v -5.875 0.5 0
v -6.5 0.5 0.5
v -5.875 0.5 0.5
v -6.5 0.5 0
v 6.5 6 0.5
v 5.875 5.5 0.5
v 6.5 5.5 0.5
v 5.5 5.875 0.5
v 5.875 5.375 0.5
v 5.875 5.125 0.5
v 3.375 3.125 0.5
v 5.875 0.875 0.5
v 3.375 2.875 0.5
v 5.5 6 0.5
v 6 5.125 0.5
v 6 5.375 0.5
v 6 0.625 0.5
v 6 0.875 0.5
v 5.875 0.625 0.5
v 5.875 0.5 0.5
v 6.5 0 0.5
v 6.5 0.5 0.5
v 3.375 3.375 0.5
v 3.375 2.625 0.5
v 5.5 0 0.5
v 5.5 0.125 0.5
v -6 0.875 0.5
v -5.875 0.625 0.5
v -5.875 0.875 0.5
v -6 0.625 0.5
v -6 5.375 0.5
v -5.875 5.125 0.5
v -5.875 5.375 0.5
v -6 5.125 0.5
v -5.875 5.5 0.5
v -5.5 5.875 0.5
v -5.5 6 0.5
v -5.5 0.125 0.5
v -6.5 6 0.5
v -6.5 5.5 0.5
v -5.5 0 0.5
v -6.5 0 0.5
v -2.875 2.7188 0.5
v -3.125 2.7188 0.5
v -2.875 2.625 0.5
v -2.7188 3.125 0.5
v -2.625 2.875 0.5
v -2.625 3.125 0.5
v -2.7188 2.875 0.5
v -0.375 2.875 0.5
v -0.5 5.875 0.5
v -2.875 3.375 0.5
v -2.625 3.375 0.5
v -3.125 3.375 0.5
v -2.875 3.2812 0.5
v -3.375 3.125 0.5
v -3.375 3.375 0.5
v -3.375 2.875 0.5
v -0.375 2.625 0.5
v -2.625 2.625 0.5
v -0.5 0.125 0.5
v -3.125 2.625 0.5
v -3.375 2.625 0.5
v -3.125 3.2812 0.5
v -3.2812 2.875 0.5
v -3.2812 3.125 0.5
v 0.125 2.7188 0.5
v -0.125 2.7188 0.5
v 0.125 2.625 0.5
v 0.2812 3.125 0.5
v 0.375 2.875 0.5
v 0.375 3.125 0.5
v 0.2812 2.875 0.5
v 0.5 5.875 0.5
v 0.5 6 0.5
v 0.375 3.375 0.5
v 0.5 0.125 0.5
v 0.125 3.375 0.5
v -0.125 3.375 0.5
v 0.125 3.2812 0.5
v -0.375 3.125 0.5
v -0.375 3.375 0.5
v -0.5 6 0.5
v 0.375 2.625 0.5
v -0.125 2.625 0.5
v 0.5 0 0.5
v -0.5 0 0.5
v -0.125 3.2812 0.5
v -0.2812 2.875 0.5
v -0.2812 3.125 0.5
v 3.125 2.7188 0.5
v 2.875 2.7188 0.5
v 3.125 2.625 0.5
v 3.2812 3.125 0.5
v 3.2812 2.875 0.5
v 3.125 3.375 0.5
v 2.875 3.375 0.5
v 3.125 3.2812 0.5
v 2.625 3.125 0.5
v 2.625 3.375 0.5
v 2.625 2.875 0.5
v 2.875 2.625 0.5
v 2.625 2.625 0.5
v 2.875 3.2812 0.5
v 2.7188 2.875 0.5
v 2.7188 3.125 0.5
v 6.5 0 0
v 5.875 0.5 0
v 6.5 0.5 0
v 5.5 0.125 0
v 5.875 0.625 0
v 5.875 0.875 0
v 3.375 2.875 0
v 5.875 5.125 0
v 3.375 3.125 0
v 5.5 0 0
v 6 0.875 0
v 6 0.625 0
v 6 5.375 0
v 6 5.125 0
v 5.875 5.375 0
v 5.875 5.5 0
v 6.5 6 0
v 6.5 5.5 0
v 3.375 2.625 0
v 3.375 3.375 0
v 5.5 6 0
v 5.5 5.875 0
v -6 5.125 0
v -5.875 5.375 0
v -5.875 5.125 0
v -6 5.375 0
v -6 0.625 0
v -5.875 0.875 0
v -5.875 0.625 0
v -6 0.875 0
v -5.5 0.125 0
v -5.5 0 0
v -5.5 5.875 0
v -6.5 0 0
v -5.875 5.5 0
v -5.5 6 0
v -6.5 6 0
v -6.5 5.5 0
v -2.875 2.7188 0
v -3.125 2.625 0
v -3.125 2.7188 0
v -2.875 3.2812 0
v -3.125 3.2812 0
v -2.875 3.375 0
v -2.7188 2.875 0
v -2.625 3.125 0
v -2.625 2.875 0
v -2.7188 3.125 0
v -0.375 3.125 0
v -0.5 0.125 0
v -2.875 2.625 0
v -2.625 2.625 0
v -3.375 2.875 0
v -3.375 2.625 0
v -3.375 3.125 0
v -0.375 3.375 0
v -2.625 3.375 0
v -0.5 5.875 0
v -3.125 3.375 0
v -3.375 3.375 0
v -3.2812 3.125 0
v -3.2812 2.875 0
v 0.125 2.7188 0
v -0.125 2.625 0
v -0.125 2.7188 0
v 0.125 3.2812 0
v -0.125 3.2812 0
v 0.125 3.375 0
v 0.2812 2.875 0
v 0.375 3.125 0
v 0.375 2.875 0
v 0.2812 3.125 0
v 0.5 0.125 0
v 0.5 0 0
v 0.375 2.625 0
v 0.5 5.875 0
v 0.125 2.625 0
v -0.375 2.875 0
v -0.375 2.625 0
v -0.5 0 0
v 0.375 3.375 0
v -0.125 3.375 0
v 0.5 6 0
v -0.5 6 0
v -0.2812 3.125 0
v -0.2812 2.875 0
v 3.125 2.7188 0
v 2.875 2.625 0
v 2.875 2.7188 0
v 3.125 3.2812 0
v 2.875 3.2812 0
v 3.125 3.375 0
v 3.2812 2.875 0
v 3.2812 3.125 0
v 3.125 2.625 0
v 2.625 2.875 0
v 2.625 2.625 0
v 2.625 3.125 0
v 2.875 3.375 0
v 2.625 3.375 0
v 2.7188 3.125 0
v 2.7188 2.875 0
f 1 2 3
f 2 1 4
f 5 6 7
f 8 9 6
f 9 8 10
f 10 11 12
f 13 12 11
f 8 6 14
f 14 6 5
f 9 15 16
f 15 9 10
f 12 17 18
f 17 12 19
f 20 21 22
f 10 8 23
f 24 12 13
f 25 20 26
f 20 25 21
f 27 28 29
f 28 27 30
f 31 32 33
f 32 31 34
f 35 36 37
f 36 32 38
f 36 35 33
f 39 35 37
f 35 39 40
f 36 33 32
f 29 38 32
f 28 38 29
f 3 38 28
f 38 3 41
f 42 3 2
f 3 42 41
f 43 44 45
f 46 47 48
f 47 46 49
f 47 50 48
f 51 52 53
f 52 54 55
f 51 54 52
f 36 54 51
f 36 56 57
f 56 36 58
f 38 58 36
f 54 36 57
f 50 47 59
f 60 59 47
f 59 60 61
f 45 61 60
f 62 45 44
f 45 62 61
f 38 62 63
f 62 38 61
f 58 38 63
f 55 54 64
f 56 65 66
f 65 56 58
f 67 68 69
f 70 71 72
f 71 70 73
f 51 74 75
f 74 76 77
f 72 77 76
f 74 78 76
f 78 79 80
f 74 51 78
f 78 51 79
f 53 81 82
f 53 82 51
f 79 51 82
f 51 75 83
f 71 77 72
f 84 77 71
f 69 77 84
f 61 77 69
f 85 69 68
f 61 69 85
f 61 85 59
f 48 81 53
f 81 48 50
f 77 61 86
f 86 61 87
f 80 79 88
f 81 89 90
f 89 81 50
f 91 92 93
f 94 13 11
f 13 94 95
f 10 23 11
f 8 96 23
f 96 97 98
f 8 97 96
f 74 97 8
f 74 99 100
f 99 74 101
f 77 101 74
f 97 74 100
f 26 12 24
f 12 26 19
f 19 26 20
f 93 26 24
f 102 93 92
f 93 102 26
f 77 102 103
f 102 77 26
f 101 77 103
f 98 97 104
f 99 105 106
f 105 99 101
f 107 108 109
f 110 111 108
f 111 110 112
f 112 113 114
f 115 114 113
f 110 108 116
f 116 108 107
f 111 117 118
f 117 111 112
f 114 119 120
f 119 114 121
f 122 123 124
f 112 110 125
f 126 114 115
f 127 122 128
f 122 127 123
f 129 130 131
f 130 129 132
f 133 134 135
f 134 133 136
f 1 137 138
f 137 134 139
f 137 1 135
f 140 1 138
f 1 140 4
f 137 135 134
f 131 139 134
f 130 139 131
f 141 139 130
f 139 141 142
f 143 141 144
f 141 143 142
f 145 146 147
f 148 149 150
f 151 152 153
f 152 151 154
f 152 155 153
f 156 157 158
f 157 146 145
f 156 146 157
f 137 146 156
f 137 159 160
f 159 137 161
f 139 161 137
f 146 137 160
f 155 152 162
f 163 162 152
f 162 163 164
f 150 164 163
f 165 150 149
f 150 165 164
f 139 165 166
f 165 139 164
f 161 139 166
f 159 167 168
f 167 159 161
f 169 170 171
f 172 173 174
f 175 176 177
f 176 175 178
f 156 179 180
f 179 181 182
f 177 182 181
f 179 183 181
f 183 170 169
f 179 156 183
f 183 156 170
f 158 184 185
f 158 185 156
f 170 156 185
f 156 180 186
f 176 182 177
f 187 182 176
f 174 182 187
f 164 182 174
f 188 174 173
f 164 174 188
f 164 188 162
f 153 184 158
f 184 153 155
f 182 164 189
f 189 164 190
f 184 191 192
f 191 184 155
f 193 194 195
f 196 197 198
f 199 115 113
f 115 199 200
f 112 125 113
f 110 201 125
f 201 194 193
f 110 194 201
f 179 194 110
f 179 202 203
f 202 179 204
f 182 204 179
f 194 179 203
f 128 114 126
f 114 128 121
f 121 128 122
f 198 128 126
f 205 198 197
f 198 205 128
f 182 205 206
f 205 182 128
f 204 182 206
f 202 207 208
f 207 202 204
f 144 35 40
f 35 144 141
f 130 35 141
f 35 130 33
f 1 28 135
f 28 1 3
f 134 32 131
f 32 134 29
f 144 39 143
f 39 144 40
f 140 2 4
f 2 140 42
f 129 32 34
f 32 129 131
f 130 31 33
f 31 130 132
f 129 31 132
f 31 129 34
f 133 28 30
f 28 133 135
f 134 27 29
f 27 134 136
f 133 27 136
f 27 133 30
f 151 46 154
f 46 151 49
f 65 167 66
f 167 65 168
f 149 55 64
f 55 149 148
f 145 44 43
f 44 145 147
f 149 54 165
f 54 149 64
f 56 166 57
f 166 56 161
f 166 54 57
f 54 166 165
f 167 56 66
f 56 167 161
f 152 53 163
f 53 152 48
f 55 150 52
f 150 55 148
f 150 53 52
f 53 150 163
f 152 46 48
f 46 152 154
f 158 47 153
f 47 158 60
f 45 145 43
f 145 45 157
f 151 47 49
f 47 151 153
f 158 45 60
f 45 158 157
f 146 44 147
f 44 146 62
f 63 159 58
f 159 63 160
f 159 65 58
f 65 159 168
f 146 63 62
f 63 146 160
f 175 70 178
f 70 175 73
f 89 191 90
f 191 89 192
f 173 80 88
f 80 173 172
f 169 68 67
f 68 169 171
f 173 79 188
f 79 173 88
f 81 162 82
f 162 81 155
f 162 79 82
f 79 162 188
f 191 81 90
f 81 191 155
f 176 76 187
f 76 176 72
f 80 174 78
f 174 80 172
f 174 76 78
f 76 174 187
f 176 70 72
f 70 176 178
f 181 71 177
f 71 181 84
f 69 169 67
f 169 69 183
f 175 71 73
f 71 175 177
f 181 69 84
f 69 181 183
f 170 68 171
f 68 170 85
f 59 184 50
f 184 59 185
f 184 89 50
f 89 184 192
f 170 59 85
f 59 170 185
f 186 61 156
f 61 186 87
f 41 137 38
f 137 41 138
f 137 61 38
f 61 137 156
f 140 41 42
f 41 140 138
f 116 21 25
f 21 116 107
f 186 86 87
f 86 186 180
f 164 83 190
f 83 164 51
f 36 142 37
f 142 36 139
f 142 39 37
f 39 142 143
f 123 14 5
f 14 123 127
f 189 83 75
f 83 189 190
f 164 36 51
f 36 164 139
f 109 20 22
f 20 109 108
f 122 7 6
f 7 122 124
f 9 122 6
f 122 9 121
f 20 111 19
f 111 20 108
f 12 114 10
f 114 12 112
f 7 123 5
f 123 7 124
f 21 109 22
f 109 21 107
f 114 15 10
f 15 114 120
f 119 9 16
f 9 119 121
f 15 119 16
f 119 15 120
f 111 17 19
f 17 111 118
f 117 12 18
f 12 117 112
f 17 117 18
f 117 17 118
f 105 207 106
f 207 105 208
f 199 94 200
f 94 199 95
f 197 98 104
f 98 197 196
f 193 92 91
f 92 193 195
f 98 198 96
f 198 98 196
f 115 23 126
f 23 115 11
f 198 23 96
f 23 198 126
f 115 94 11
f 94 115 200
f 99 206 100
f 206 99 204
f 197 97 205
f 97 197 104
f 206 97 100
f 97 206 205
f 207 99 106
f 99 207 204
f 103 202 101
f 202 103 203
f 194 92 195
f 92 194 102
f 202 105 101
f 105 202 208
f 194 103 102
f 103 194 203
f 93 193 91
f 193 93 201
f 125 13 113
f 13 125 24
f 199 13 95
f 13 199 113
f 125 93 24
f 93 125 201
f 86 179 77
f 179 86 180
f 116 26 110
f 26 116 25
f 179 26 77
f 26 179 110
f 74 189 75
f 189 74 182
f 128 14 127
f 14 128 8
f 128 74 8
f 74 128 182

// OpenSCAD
// file: modus.scad
//Corner Joint - allows the sides of two parts to create inlayed corner. Aids with welding.
//need to verify module math is the same throughout all parts.

module cornerjoint(Z,L,H,EndGap,PadL,PadH,CJangle,CJcenter){
    //change so that H = Z of inlayed part (usually 0.5)
    //add center and angle in degrees option, orgin far side of cut out area

     if((CJangle==0)&&(CJcenter==0))
      {    
        translate([0,0,0])
        rotate([0,0,CJangle])
        difference(){
        cube([L,H+PadH,Z]);
        translate([EndGap,H,0])
        cube([PadL,PadH,Z]);
        translate([L-EndGap-PadL,H,0])
        cube([PadL,PadH,Z]);}
      }    
else if((CJangle==90)&&(CJcenter==0))
      {    
        translate([H+PadH,0,0])
        rotate([0,0,CJangle])
        difference(){
        cube([L,H+PadH,Z]);
        translate([EndGap,H,0])
        cube([PadL,PadH,Z]);
        translate([L-EndGap-PadL,H,0])
        cube([PadL,PadH,Z]);}
      }
else if((CJangle==180)&&(CJcenter==0))       
      {    
        translate([L,H+PadH,0])
        rotate([0,0,CJangle])
        difference(){
        cube([L,H+PadH,Z]);
        translate([EndGap,H,0])
        cube([PadL,PadH,Z]);
        translate([L-EndGap-PadL,H,0])
        cube([PadL,PadH,Z]);}
      }
else if((CJangle==270)&&(CJcenter==0))
      {    
        translate([0,L,0])
        rotate([0,0,CJangle])
        difference(){
        cube([L,H+PadH,Z]);
        translate([EndGap,H,0])
        cube([PadL,PadH,Z]);
        translate([L-EndGap-PadL,H,0])
        cube([PadL,PadH,Z]);}
      }  
      
//centered     
   
else if((CJangle==0)&&(CJcenter==1))
      {    
        translate([-L/2,0,0])
        rotate([0,0,CJangle])
        difference(){
        cube([L,H+PadH,Z]);
        translate([EndGap,H,0])
        cube([PadL,PadH,Z]);
        translate([L-EndGap-PadL,H,0])
        cube([PadL,PadH,Z]);}
      }  
else if((CJangle==90)&&(CJcenter==1))
      {    
        translate([0,-L/2,0])
        rotate([0,0,CJangle])
        difference(){
        cube([L,H+PadH,Z]);
        translate([EndGap,H,0])
        cube([PadL,PadH,Z]);
        translate([L-EndGap-PadL,H,0])
        cube([PadL,PadH,Z]);}
      }
else if((CJangle==180)&&(CJcenter==1))       
      {    
        translate([L/2,0,0])
        rotate([0,0,CJangle])
        difference(){
        cube([L,H+PadH,Z]);
        translate([EndGap,H,0])
        cube([PadL,PadH,Z]);
        translate([L-EndGap-PadL,H,0])
        cube([PadL,PadH,Z]);}
      }
else if((CJangle==270)&&(CJcenter==1))
      {    
        translate([0,L/2,0])
        rotate([0,0,CJangle])
        difference(){
        cube([L,H+PadH,Z]);
        translate([EndGap,H,0])
        cube([PadL,PadH,Z]);
        translate([L-EndGap-PadL,H,0])
        cube([PadL,PadH,Z]);}
      }
} //end cornerjoint module

//Tab Insert - used to cut a hole for an abutting part to insert into. Typically aids with welding the two parts.
module tabinsert(X,Y,Z,dGap,cGap,c1,c2,c3,c4,c5,c6,c7,c8,center){
    translate([-dGap-(center*(X/2)),-dGap-(center*(Y/2)),0]){
        //main cut
        cube([X+(dGap*2),Y+(dGap*2),Z]);
        //corner c1c2
        translate([-cGap,(Y+(dGap*2))-c1+cGap,0])
            {
        cube([c2,c1,Z]);}
       //corner c3c4
       translate([(X+(dGap*2))-c3+cGap,(Y+(dGap*2))-c4+cGap,0]){
           cube([c3,c4,Z]);
       }
       //corner c5c6
       translate([(X+(dGap*2))-c6+cGap,-cGap,0])
      {
          cube([c6,c5,Z]);
      }
       
       //corner c7c8 
       translate([-cGap,-cGap,0]){
           cube([c7,c8,Z]);
       }
    
    } //end center translate
} //end tabinsert module
 
// file: vars.scad
brickW=6; 
brickL=12;
brickCH=6;

$fn=8; //defines resolution of circles. 8 is okay for review. 100  or greater should be used for for final dxf export.

dZstandard=0.5; //thickness of steel to be cut for drawer parts
fZstandard=0.5;
aZstandard=0.5; //thickness of steel to be cut for arm parts

fBOLTHOLEstandardD=1; //standard bolts used on frame
sliderodholeOD=1.2; 

dGap=0.03125; //gap between a hole cut's edge and the part sitting within the hole. //D3 appears to use 0.3125, is this in error?

//all parts set to standard thickness below
//off standard preferences can be defined below

//drawer
drawergap=0.0283;  //extra room for drawer to slide in the space between f1 and f4
drawerHgap=0.1884;  //total extra space from drawer sides to frame walls. sum of both sides.

d1z=dZstandard;
d2z=dZstandard;
d3z=dZstandard;
d4z=dZstandard;
d5z=dZstandard;
d6z=dZstandard;
d5z=dZstandard;
d7z=dZstandard;
d8z=dZstandard;
d9z=dZstandard;

//frame
f1x=24.2;
f1y=6;
f1z=0.5;


f2y=3.5;
f2z=fZstandard;

f3x=f1x;
f3y=3.5;
f3z=fZstandard;

f4y=11;
f4z=fZstandard;

f5y=3.5;
f5z=fZstandard;

f6y=8;
f6z=fZstandard;

f8y=brickW;
f8z=fZstandard;
f8boltD=1;

f9y=4.5;
f9x=43.5;  //set based on MAINcylinder
f9z=fZstandard;

f8x=f9x;

f11x=1.25;
f11z=fZstandard;

f13z=fZstandard;

//arms

a1x=4;
a1y=72; //calculate based on drawer cylinder
a1z=aZstandard;

a2x=6;
a2y=72;  //calculate based on drawer cylinder
a2z=aZstandard;

a4z=aZstandard;
a6z=aZstandard;

//
//Input your main cylinder's dimenions here
//
cylinderMAINminC2E=0; //main hydraulic cylinder's distance from center of mounting hole to the end of the shaft when fully compressed.
cylinderMAINmaxC2E=0; //main hydraulic cylinder's distance from center of mounting hole to the end of the shaft when fully extended.

//
//Input your drawer cylinder's dimenions here
//
cylinderDRAWERbodyH=3; //measured when in position, largest length from top to bottom of cylinder
cylinderDRAWERminC2C=0; //drawer's hydraulic cylinder's distance from the center of one mounting hole to the center of the other when fully compressed.
cylinderDRAWERmaxC2C=0; ///drawer's hydraulic cylinder's distance from the center of one mounting hole to the center of the other when fully extended.
cylinderDRAWERrodclevisW=2.5; //width of cylinders' clevis on end of rod
cylinderDRAWERrodclevisID=1;
cylinderDRAWERrodclevisOD=2;
cylinderDRAWERrearclevisW=2.5; //width of mounting clevis cylinder body
cylinderDRAWERrearclevisID=1;
cylinderDRAWERrearclevisOD=2;
cylinderDRAWERrearclevisClearance=3; //usable space around rear clevis pin (in diameter). be aware of hyraulic fittings.

//the following variables are calculated in order of dependence on preceding variables
d3x=brickL+(d2z*2);
d3y=brickCH-d1z;
d4x=brickW+d3z+d3z;
d4y=brickCH-d1z;
d5x=brickL+(d2z*2);
d5y=brickW;
d6x=brickL+(d2z*2);
d6y=brickCH;
d7x=cylinderDRAWERrearclevisClearance;
d7y=a4z+d8z+cylinderDRAWERbodyH;
d9x=cylinderDRAWERbodyH+d6z;
d9y=cylinderDRAWERbodyH+d8z;
d8x=brickL+(d2z*2);
d8y=max(5,(d9x-d6z));   //need to review fundamentals, 5 minimun unless d9 gets larger than d8
d1x=18.5;   //need to come up with a formula
d1y=18;     //need to come up with a formula
d2x=d8y+d6z+brickW+d3z+d5y+d3z;
d2y=brickCH;

f11y=f8y;
f6x=brickL+(d2z*2)+(f9y*2)+drawerHgap;
f8x=43.5;  //need to define based on MAINcylinder inputs


f2x=brickL+(d2z*2)+drawerHgap+(f9y*2)-(1.4*2);  //distance between large cut outs in f9

f5x=brickL+(d2z*2)+drawerHgap+(f9y*2)+(a1x*2); //distance between outer edges of each A1

f4x=f5x-0.5;   //same as f5 but minus 0.25 on each side to give a little overhang
// main file
include <vars.scad>;
use <modus.scad>;

d5p();

module d5p(){

difference(){
translate([-(d5x/2),0,0])
cube([d5x,d5y,d5z]);
translate([-(d5x/2),0,0])
cuts();
translate([(d5x/2),0,0])
mirror([1,0,0])
cuts();
} //end difference

module cuts(){
    translate([0,d5y/2,0])
    cornerjoint(d5z,d5y-(0.5*2),d2z,0.125,0.25,0.125,270,1);

    translate([1,0,0])
        cube([(d5x-(1*3))/2,0.125,d5z]);
        translate([1,d5y-0.125,0])
        cube([(d5x-(1*3))/2,0.125,d5z]);
    
    translate([(brickL/4)+d2z,d5y/2,0])
    tabinsert(0.5,0.5,d5z,0.03125,0.09375,0.25,0.25,0.25,0.25,0.25,0.25,0.25,0.25,1);
 
        translate([d5x/2,3,0])
    tabinsert(0.5,0.5,d5z,0.03125,0.09375,0.25,0.25,0.25,0.25,0.25,0.25,0.25,0.25,1);

} //end cuts module

} //end d5p module
